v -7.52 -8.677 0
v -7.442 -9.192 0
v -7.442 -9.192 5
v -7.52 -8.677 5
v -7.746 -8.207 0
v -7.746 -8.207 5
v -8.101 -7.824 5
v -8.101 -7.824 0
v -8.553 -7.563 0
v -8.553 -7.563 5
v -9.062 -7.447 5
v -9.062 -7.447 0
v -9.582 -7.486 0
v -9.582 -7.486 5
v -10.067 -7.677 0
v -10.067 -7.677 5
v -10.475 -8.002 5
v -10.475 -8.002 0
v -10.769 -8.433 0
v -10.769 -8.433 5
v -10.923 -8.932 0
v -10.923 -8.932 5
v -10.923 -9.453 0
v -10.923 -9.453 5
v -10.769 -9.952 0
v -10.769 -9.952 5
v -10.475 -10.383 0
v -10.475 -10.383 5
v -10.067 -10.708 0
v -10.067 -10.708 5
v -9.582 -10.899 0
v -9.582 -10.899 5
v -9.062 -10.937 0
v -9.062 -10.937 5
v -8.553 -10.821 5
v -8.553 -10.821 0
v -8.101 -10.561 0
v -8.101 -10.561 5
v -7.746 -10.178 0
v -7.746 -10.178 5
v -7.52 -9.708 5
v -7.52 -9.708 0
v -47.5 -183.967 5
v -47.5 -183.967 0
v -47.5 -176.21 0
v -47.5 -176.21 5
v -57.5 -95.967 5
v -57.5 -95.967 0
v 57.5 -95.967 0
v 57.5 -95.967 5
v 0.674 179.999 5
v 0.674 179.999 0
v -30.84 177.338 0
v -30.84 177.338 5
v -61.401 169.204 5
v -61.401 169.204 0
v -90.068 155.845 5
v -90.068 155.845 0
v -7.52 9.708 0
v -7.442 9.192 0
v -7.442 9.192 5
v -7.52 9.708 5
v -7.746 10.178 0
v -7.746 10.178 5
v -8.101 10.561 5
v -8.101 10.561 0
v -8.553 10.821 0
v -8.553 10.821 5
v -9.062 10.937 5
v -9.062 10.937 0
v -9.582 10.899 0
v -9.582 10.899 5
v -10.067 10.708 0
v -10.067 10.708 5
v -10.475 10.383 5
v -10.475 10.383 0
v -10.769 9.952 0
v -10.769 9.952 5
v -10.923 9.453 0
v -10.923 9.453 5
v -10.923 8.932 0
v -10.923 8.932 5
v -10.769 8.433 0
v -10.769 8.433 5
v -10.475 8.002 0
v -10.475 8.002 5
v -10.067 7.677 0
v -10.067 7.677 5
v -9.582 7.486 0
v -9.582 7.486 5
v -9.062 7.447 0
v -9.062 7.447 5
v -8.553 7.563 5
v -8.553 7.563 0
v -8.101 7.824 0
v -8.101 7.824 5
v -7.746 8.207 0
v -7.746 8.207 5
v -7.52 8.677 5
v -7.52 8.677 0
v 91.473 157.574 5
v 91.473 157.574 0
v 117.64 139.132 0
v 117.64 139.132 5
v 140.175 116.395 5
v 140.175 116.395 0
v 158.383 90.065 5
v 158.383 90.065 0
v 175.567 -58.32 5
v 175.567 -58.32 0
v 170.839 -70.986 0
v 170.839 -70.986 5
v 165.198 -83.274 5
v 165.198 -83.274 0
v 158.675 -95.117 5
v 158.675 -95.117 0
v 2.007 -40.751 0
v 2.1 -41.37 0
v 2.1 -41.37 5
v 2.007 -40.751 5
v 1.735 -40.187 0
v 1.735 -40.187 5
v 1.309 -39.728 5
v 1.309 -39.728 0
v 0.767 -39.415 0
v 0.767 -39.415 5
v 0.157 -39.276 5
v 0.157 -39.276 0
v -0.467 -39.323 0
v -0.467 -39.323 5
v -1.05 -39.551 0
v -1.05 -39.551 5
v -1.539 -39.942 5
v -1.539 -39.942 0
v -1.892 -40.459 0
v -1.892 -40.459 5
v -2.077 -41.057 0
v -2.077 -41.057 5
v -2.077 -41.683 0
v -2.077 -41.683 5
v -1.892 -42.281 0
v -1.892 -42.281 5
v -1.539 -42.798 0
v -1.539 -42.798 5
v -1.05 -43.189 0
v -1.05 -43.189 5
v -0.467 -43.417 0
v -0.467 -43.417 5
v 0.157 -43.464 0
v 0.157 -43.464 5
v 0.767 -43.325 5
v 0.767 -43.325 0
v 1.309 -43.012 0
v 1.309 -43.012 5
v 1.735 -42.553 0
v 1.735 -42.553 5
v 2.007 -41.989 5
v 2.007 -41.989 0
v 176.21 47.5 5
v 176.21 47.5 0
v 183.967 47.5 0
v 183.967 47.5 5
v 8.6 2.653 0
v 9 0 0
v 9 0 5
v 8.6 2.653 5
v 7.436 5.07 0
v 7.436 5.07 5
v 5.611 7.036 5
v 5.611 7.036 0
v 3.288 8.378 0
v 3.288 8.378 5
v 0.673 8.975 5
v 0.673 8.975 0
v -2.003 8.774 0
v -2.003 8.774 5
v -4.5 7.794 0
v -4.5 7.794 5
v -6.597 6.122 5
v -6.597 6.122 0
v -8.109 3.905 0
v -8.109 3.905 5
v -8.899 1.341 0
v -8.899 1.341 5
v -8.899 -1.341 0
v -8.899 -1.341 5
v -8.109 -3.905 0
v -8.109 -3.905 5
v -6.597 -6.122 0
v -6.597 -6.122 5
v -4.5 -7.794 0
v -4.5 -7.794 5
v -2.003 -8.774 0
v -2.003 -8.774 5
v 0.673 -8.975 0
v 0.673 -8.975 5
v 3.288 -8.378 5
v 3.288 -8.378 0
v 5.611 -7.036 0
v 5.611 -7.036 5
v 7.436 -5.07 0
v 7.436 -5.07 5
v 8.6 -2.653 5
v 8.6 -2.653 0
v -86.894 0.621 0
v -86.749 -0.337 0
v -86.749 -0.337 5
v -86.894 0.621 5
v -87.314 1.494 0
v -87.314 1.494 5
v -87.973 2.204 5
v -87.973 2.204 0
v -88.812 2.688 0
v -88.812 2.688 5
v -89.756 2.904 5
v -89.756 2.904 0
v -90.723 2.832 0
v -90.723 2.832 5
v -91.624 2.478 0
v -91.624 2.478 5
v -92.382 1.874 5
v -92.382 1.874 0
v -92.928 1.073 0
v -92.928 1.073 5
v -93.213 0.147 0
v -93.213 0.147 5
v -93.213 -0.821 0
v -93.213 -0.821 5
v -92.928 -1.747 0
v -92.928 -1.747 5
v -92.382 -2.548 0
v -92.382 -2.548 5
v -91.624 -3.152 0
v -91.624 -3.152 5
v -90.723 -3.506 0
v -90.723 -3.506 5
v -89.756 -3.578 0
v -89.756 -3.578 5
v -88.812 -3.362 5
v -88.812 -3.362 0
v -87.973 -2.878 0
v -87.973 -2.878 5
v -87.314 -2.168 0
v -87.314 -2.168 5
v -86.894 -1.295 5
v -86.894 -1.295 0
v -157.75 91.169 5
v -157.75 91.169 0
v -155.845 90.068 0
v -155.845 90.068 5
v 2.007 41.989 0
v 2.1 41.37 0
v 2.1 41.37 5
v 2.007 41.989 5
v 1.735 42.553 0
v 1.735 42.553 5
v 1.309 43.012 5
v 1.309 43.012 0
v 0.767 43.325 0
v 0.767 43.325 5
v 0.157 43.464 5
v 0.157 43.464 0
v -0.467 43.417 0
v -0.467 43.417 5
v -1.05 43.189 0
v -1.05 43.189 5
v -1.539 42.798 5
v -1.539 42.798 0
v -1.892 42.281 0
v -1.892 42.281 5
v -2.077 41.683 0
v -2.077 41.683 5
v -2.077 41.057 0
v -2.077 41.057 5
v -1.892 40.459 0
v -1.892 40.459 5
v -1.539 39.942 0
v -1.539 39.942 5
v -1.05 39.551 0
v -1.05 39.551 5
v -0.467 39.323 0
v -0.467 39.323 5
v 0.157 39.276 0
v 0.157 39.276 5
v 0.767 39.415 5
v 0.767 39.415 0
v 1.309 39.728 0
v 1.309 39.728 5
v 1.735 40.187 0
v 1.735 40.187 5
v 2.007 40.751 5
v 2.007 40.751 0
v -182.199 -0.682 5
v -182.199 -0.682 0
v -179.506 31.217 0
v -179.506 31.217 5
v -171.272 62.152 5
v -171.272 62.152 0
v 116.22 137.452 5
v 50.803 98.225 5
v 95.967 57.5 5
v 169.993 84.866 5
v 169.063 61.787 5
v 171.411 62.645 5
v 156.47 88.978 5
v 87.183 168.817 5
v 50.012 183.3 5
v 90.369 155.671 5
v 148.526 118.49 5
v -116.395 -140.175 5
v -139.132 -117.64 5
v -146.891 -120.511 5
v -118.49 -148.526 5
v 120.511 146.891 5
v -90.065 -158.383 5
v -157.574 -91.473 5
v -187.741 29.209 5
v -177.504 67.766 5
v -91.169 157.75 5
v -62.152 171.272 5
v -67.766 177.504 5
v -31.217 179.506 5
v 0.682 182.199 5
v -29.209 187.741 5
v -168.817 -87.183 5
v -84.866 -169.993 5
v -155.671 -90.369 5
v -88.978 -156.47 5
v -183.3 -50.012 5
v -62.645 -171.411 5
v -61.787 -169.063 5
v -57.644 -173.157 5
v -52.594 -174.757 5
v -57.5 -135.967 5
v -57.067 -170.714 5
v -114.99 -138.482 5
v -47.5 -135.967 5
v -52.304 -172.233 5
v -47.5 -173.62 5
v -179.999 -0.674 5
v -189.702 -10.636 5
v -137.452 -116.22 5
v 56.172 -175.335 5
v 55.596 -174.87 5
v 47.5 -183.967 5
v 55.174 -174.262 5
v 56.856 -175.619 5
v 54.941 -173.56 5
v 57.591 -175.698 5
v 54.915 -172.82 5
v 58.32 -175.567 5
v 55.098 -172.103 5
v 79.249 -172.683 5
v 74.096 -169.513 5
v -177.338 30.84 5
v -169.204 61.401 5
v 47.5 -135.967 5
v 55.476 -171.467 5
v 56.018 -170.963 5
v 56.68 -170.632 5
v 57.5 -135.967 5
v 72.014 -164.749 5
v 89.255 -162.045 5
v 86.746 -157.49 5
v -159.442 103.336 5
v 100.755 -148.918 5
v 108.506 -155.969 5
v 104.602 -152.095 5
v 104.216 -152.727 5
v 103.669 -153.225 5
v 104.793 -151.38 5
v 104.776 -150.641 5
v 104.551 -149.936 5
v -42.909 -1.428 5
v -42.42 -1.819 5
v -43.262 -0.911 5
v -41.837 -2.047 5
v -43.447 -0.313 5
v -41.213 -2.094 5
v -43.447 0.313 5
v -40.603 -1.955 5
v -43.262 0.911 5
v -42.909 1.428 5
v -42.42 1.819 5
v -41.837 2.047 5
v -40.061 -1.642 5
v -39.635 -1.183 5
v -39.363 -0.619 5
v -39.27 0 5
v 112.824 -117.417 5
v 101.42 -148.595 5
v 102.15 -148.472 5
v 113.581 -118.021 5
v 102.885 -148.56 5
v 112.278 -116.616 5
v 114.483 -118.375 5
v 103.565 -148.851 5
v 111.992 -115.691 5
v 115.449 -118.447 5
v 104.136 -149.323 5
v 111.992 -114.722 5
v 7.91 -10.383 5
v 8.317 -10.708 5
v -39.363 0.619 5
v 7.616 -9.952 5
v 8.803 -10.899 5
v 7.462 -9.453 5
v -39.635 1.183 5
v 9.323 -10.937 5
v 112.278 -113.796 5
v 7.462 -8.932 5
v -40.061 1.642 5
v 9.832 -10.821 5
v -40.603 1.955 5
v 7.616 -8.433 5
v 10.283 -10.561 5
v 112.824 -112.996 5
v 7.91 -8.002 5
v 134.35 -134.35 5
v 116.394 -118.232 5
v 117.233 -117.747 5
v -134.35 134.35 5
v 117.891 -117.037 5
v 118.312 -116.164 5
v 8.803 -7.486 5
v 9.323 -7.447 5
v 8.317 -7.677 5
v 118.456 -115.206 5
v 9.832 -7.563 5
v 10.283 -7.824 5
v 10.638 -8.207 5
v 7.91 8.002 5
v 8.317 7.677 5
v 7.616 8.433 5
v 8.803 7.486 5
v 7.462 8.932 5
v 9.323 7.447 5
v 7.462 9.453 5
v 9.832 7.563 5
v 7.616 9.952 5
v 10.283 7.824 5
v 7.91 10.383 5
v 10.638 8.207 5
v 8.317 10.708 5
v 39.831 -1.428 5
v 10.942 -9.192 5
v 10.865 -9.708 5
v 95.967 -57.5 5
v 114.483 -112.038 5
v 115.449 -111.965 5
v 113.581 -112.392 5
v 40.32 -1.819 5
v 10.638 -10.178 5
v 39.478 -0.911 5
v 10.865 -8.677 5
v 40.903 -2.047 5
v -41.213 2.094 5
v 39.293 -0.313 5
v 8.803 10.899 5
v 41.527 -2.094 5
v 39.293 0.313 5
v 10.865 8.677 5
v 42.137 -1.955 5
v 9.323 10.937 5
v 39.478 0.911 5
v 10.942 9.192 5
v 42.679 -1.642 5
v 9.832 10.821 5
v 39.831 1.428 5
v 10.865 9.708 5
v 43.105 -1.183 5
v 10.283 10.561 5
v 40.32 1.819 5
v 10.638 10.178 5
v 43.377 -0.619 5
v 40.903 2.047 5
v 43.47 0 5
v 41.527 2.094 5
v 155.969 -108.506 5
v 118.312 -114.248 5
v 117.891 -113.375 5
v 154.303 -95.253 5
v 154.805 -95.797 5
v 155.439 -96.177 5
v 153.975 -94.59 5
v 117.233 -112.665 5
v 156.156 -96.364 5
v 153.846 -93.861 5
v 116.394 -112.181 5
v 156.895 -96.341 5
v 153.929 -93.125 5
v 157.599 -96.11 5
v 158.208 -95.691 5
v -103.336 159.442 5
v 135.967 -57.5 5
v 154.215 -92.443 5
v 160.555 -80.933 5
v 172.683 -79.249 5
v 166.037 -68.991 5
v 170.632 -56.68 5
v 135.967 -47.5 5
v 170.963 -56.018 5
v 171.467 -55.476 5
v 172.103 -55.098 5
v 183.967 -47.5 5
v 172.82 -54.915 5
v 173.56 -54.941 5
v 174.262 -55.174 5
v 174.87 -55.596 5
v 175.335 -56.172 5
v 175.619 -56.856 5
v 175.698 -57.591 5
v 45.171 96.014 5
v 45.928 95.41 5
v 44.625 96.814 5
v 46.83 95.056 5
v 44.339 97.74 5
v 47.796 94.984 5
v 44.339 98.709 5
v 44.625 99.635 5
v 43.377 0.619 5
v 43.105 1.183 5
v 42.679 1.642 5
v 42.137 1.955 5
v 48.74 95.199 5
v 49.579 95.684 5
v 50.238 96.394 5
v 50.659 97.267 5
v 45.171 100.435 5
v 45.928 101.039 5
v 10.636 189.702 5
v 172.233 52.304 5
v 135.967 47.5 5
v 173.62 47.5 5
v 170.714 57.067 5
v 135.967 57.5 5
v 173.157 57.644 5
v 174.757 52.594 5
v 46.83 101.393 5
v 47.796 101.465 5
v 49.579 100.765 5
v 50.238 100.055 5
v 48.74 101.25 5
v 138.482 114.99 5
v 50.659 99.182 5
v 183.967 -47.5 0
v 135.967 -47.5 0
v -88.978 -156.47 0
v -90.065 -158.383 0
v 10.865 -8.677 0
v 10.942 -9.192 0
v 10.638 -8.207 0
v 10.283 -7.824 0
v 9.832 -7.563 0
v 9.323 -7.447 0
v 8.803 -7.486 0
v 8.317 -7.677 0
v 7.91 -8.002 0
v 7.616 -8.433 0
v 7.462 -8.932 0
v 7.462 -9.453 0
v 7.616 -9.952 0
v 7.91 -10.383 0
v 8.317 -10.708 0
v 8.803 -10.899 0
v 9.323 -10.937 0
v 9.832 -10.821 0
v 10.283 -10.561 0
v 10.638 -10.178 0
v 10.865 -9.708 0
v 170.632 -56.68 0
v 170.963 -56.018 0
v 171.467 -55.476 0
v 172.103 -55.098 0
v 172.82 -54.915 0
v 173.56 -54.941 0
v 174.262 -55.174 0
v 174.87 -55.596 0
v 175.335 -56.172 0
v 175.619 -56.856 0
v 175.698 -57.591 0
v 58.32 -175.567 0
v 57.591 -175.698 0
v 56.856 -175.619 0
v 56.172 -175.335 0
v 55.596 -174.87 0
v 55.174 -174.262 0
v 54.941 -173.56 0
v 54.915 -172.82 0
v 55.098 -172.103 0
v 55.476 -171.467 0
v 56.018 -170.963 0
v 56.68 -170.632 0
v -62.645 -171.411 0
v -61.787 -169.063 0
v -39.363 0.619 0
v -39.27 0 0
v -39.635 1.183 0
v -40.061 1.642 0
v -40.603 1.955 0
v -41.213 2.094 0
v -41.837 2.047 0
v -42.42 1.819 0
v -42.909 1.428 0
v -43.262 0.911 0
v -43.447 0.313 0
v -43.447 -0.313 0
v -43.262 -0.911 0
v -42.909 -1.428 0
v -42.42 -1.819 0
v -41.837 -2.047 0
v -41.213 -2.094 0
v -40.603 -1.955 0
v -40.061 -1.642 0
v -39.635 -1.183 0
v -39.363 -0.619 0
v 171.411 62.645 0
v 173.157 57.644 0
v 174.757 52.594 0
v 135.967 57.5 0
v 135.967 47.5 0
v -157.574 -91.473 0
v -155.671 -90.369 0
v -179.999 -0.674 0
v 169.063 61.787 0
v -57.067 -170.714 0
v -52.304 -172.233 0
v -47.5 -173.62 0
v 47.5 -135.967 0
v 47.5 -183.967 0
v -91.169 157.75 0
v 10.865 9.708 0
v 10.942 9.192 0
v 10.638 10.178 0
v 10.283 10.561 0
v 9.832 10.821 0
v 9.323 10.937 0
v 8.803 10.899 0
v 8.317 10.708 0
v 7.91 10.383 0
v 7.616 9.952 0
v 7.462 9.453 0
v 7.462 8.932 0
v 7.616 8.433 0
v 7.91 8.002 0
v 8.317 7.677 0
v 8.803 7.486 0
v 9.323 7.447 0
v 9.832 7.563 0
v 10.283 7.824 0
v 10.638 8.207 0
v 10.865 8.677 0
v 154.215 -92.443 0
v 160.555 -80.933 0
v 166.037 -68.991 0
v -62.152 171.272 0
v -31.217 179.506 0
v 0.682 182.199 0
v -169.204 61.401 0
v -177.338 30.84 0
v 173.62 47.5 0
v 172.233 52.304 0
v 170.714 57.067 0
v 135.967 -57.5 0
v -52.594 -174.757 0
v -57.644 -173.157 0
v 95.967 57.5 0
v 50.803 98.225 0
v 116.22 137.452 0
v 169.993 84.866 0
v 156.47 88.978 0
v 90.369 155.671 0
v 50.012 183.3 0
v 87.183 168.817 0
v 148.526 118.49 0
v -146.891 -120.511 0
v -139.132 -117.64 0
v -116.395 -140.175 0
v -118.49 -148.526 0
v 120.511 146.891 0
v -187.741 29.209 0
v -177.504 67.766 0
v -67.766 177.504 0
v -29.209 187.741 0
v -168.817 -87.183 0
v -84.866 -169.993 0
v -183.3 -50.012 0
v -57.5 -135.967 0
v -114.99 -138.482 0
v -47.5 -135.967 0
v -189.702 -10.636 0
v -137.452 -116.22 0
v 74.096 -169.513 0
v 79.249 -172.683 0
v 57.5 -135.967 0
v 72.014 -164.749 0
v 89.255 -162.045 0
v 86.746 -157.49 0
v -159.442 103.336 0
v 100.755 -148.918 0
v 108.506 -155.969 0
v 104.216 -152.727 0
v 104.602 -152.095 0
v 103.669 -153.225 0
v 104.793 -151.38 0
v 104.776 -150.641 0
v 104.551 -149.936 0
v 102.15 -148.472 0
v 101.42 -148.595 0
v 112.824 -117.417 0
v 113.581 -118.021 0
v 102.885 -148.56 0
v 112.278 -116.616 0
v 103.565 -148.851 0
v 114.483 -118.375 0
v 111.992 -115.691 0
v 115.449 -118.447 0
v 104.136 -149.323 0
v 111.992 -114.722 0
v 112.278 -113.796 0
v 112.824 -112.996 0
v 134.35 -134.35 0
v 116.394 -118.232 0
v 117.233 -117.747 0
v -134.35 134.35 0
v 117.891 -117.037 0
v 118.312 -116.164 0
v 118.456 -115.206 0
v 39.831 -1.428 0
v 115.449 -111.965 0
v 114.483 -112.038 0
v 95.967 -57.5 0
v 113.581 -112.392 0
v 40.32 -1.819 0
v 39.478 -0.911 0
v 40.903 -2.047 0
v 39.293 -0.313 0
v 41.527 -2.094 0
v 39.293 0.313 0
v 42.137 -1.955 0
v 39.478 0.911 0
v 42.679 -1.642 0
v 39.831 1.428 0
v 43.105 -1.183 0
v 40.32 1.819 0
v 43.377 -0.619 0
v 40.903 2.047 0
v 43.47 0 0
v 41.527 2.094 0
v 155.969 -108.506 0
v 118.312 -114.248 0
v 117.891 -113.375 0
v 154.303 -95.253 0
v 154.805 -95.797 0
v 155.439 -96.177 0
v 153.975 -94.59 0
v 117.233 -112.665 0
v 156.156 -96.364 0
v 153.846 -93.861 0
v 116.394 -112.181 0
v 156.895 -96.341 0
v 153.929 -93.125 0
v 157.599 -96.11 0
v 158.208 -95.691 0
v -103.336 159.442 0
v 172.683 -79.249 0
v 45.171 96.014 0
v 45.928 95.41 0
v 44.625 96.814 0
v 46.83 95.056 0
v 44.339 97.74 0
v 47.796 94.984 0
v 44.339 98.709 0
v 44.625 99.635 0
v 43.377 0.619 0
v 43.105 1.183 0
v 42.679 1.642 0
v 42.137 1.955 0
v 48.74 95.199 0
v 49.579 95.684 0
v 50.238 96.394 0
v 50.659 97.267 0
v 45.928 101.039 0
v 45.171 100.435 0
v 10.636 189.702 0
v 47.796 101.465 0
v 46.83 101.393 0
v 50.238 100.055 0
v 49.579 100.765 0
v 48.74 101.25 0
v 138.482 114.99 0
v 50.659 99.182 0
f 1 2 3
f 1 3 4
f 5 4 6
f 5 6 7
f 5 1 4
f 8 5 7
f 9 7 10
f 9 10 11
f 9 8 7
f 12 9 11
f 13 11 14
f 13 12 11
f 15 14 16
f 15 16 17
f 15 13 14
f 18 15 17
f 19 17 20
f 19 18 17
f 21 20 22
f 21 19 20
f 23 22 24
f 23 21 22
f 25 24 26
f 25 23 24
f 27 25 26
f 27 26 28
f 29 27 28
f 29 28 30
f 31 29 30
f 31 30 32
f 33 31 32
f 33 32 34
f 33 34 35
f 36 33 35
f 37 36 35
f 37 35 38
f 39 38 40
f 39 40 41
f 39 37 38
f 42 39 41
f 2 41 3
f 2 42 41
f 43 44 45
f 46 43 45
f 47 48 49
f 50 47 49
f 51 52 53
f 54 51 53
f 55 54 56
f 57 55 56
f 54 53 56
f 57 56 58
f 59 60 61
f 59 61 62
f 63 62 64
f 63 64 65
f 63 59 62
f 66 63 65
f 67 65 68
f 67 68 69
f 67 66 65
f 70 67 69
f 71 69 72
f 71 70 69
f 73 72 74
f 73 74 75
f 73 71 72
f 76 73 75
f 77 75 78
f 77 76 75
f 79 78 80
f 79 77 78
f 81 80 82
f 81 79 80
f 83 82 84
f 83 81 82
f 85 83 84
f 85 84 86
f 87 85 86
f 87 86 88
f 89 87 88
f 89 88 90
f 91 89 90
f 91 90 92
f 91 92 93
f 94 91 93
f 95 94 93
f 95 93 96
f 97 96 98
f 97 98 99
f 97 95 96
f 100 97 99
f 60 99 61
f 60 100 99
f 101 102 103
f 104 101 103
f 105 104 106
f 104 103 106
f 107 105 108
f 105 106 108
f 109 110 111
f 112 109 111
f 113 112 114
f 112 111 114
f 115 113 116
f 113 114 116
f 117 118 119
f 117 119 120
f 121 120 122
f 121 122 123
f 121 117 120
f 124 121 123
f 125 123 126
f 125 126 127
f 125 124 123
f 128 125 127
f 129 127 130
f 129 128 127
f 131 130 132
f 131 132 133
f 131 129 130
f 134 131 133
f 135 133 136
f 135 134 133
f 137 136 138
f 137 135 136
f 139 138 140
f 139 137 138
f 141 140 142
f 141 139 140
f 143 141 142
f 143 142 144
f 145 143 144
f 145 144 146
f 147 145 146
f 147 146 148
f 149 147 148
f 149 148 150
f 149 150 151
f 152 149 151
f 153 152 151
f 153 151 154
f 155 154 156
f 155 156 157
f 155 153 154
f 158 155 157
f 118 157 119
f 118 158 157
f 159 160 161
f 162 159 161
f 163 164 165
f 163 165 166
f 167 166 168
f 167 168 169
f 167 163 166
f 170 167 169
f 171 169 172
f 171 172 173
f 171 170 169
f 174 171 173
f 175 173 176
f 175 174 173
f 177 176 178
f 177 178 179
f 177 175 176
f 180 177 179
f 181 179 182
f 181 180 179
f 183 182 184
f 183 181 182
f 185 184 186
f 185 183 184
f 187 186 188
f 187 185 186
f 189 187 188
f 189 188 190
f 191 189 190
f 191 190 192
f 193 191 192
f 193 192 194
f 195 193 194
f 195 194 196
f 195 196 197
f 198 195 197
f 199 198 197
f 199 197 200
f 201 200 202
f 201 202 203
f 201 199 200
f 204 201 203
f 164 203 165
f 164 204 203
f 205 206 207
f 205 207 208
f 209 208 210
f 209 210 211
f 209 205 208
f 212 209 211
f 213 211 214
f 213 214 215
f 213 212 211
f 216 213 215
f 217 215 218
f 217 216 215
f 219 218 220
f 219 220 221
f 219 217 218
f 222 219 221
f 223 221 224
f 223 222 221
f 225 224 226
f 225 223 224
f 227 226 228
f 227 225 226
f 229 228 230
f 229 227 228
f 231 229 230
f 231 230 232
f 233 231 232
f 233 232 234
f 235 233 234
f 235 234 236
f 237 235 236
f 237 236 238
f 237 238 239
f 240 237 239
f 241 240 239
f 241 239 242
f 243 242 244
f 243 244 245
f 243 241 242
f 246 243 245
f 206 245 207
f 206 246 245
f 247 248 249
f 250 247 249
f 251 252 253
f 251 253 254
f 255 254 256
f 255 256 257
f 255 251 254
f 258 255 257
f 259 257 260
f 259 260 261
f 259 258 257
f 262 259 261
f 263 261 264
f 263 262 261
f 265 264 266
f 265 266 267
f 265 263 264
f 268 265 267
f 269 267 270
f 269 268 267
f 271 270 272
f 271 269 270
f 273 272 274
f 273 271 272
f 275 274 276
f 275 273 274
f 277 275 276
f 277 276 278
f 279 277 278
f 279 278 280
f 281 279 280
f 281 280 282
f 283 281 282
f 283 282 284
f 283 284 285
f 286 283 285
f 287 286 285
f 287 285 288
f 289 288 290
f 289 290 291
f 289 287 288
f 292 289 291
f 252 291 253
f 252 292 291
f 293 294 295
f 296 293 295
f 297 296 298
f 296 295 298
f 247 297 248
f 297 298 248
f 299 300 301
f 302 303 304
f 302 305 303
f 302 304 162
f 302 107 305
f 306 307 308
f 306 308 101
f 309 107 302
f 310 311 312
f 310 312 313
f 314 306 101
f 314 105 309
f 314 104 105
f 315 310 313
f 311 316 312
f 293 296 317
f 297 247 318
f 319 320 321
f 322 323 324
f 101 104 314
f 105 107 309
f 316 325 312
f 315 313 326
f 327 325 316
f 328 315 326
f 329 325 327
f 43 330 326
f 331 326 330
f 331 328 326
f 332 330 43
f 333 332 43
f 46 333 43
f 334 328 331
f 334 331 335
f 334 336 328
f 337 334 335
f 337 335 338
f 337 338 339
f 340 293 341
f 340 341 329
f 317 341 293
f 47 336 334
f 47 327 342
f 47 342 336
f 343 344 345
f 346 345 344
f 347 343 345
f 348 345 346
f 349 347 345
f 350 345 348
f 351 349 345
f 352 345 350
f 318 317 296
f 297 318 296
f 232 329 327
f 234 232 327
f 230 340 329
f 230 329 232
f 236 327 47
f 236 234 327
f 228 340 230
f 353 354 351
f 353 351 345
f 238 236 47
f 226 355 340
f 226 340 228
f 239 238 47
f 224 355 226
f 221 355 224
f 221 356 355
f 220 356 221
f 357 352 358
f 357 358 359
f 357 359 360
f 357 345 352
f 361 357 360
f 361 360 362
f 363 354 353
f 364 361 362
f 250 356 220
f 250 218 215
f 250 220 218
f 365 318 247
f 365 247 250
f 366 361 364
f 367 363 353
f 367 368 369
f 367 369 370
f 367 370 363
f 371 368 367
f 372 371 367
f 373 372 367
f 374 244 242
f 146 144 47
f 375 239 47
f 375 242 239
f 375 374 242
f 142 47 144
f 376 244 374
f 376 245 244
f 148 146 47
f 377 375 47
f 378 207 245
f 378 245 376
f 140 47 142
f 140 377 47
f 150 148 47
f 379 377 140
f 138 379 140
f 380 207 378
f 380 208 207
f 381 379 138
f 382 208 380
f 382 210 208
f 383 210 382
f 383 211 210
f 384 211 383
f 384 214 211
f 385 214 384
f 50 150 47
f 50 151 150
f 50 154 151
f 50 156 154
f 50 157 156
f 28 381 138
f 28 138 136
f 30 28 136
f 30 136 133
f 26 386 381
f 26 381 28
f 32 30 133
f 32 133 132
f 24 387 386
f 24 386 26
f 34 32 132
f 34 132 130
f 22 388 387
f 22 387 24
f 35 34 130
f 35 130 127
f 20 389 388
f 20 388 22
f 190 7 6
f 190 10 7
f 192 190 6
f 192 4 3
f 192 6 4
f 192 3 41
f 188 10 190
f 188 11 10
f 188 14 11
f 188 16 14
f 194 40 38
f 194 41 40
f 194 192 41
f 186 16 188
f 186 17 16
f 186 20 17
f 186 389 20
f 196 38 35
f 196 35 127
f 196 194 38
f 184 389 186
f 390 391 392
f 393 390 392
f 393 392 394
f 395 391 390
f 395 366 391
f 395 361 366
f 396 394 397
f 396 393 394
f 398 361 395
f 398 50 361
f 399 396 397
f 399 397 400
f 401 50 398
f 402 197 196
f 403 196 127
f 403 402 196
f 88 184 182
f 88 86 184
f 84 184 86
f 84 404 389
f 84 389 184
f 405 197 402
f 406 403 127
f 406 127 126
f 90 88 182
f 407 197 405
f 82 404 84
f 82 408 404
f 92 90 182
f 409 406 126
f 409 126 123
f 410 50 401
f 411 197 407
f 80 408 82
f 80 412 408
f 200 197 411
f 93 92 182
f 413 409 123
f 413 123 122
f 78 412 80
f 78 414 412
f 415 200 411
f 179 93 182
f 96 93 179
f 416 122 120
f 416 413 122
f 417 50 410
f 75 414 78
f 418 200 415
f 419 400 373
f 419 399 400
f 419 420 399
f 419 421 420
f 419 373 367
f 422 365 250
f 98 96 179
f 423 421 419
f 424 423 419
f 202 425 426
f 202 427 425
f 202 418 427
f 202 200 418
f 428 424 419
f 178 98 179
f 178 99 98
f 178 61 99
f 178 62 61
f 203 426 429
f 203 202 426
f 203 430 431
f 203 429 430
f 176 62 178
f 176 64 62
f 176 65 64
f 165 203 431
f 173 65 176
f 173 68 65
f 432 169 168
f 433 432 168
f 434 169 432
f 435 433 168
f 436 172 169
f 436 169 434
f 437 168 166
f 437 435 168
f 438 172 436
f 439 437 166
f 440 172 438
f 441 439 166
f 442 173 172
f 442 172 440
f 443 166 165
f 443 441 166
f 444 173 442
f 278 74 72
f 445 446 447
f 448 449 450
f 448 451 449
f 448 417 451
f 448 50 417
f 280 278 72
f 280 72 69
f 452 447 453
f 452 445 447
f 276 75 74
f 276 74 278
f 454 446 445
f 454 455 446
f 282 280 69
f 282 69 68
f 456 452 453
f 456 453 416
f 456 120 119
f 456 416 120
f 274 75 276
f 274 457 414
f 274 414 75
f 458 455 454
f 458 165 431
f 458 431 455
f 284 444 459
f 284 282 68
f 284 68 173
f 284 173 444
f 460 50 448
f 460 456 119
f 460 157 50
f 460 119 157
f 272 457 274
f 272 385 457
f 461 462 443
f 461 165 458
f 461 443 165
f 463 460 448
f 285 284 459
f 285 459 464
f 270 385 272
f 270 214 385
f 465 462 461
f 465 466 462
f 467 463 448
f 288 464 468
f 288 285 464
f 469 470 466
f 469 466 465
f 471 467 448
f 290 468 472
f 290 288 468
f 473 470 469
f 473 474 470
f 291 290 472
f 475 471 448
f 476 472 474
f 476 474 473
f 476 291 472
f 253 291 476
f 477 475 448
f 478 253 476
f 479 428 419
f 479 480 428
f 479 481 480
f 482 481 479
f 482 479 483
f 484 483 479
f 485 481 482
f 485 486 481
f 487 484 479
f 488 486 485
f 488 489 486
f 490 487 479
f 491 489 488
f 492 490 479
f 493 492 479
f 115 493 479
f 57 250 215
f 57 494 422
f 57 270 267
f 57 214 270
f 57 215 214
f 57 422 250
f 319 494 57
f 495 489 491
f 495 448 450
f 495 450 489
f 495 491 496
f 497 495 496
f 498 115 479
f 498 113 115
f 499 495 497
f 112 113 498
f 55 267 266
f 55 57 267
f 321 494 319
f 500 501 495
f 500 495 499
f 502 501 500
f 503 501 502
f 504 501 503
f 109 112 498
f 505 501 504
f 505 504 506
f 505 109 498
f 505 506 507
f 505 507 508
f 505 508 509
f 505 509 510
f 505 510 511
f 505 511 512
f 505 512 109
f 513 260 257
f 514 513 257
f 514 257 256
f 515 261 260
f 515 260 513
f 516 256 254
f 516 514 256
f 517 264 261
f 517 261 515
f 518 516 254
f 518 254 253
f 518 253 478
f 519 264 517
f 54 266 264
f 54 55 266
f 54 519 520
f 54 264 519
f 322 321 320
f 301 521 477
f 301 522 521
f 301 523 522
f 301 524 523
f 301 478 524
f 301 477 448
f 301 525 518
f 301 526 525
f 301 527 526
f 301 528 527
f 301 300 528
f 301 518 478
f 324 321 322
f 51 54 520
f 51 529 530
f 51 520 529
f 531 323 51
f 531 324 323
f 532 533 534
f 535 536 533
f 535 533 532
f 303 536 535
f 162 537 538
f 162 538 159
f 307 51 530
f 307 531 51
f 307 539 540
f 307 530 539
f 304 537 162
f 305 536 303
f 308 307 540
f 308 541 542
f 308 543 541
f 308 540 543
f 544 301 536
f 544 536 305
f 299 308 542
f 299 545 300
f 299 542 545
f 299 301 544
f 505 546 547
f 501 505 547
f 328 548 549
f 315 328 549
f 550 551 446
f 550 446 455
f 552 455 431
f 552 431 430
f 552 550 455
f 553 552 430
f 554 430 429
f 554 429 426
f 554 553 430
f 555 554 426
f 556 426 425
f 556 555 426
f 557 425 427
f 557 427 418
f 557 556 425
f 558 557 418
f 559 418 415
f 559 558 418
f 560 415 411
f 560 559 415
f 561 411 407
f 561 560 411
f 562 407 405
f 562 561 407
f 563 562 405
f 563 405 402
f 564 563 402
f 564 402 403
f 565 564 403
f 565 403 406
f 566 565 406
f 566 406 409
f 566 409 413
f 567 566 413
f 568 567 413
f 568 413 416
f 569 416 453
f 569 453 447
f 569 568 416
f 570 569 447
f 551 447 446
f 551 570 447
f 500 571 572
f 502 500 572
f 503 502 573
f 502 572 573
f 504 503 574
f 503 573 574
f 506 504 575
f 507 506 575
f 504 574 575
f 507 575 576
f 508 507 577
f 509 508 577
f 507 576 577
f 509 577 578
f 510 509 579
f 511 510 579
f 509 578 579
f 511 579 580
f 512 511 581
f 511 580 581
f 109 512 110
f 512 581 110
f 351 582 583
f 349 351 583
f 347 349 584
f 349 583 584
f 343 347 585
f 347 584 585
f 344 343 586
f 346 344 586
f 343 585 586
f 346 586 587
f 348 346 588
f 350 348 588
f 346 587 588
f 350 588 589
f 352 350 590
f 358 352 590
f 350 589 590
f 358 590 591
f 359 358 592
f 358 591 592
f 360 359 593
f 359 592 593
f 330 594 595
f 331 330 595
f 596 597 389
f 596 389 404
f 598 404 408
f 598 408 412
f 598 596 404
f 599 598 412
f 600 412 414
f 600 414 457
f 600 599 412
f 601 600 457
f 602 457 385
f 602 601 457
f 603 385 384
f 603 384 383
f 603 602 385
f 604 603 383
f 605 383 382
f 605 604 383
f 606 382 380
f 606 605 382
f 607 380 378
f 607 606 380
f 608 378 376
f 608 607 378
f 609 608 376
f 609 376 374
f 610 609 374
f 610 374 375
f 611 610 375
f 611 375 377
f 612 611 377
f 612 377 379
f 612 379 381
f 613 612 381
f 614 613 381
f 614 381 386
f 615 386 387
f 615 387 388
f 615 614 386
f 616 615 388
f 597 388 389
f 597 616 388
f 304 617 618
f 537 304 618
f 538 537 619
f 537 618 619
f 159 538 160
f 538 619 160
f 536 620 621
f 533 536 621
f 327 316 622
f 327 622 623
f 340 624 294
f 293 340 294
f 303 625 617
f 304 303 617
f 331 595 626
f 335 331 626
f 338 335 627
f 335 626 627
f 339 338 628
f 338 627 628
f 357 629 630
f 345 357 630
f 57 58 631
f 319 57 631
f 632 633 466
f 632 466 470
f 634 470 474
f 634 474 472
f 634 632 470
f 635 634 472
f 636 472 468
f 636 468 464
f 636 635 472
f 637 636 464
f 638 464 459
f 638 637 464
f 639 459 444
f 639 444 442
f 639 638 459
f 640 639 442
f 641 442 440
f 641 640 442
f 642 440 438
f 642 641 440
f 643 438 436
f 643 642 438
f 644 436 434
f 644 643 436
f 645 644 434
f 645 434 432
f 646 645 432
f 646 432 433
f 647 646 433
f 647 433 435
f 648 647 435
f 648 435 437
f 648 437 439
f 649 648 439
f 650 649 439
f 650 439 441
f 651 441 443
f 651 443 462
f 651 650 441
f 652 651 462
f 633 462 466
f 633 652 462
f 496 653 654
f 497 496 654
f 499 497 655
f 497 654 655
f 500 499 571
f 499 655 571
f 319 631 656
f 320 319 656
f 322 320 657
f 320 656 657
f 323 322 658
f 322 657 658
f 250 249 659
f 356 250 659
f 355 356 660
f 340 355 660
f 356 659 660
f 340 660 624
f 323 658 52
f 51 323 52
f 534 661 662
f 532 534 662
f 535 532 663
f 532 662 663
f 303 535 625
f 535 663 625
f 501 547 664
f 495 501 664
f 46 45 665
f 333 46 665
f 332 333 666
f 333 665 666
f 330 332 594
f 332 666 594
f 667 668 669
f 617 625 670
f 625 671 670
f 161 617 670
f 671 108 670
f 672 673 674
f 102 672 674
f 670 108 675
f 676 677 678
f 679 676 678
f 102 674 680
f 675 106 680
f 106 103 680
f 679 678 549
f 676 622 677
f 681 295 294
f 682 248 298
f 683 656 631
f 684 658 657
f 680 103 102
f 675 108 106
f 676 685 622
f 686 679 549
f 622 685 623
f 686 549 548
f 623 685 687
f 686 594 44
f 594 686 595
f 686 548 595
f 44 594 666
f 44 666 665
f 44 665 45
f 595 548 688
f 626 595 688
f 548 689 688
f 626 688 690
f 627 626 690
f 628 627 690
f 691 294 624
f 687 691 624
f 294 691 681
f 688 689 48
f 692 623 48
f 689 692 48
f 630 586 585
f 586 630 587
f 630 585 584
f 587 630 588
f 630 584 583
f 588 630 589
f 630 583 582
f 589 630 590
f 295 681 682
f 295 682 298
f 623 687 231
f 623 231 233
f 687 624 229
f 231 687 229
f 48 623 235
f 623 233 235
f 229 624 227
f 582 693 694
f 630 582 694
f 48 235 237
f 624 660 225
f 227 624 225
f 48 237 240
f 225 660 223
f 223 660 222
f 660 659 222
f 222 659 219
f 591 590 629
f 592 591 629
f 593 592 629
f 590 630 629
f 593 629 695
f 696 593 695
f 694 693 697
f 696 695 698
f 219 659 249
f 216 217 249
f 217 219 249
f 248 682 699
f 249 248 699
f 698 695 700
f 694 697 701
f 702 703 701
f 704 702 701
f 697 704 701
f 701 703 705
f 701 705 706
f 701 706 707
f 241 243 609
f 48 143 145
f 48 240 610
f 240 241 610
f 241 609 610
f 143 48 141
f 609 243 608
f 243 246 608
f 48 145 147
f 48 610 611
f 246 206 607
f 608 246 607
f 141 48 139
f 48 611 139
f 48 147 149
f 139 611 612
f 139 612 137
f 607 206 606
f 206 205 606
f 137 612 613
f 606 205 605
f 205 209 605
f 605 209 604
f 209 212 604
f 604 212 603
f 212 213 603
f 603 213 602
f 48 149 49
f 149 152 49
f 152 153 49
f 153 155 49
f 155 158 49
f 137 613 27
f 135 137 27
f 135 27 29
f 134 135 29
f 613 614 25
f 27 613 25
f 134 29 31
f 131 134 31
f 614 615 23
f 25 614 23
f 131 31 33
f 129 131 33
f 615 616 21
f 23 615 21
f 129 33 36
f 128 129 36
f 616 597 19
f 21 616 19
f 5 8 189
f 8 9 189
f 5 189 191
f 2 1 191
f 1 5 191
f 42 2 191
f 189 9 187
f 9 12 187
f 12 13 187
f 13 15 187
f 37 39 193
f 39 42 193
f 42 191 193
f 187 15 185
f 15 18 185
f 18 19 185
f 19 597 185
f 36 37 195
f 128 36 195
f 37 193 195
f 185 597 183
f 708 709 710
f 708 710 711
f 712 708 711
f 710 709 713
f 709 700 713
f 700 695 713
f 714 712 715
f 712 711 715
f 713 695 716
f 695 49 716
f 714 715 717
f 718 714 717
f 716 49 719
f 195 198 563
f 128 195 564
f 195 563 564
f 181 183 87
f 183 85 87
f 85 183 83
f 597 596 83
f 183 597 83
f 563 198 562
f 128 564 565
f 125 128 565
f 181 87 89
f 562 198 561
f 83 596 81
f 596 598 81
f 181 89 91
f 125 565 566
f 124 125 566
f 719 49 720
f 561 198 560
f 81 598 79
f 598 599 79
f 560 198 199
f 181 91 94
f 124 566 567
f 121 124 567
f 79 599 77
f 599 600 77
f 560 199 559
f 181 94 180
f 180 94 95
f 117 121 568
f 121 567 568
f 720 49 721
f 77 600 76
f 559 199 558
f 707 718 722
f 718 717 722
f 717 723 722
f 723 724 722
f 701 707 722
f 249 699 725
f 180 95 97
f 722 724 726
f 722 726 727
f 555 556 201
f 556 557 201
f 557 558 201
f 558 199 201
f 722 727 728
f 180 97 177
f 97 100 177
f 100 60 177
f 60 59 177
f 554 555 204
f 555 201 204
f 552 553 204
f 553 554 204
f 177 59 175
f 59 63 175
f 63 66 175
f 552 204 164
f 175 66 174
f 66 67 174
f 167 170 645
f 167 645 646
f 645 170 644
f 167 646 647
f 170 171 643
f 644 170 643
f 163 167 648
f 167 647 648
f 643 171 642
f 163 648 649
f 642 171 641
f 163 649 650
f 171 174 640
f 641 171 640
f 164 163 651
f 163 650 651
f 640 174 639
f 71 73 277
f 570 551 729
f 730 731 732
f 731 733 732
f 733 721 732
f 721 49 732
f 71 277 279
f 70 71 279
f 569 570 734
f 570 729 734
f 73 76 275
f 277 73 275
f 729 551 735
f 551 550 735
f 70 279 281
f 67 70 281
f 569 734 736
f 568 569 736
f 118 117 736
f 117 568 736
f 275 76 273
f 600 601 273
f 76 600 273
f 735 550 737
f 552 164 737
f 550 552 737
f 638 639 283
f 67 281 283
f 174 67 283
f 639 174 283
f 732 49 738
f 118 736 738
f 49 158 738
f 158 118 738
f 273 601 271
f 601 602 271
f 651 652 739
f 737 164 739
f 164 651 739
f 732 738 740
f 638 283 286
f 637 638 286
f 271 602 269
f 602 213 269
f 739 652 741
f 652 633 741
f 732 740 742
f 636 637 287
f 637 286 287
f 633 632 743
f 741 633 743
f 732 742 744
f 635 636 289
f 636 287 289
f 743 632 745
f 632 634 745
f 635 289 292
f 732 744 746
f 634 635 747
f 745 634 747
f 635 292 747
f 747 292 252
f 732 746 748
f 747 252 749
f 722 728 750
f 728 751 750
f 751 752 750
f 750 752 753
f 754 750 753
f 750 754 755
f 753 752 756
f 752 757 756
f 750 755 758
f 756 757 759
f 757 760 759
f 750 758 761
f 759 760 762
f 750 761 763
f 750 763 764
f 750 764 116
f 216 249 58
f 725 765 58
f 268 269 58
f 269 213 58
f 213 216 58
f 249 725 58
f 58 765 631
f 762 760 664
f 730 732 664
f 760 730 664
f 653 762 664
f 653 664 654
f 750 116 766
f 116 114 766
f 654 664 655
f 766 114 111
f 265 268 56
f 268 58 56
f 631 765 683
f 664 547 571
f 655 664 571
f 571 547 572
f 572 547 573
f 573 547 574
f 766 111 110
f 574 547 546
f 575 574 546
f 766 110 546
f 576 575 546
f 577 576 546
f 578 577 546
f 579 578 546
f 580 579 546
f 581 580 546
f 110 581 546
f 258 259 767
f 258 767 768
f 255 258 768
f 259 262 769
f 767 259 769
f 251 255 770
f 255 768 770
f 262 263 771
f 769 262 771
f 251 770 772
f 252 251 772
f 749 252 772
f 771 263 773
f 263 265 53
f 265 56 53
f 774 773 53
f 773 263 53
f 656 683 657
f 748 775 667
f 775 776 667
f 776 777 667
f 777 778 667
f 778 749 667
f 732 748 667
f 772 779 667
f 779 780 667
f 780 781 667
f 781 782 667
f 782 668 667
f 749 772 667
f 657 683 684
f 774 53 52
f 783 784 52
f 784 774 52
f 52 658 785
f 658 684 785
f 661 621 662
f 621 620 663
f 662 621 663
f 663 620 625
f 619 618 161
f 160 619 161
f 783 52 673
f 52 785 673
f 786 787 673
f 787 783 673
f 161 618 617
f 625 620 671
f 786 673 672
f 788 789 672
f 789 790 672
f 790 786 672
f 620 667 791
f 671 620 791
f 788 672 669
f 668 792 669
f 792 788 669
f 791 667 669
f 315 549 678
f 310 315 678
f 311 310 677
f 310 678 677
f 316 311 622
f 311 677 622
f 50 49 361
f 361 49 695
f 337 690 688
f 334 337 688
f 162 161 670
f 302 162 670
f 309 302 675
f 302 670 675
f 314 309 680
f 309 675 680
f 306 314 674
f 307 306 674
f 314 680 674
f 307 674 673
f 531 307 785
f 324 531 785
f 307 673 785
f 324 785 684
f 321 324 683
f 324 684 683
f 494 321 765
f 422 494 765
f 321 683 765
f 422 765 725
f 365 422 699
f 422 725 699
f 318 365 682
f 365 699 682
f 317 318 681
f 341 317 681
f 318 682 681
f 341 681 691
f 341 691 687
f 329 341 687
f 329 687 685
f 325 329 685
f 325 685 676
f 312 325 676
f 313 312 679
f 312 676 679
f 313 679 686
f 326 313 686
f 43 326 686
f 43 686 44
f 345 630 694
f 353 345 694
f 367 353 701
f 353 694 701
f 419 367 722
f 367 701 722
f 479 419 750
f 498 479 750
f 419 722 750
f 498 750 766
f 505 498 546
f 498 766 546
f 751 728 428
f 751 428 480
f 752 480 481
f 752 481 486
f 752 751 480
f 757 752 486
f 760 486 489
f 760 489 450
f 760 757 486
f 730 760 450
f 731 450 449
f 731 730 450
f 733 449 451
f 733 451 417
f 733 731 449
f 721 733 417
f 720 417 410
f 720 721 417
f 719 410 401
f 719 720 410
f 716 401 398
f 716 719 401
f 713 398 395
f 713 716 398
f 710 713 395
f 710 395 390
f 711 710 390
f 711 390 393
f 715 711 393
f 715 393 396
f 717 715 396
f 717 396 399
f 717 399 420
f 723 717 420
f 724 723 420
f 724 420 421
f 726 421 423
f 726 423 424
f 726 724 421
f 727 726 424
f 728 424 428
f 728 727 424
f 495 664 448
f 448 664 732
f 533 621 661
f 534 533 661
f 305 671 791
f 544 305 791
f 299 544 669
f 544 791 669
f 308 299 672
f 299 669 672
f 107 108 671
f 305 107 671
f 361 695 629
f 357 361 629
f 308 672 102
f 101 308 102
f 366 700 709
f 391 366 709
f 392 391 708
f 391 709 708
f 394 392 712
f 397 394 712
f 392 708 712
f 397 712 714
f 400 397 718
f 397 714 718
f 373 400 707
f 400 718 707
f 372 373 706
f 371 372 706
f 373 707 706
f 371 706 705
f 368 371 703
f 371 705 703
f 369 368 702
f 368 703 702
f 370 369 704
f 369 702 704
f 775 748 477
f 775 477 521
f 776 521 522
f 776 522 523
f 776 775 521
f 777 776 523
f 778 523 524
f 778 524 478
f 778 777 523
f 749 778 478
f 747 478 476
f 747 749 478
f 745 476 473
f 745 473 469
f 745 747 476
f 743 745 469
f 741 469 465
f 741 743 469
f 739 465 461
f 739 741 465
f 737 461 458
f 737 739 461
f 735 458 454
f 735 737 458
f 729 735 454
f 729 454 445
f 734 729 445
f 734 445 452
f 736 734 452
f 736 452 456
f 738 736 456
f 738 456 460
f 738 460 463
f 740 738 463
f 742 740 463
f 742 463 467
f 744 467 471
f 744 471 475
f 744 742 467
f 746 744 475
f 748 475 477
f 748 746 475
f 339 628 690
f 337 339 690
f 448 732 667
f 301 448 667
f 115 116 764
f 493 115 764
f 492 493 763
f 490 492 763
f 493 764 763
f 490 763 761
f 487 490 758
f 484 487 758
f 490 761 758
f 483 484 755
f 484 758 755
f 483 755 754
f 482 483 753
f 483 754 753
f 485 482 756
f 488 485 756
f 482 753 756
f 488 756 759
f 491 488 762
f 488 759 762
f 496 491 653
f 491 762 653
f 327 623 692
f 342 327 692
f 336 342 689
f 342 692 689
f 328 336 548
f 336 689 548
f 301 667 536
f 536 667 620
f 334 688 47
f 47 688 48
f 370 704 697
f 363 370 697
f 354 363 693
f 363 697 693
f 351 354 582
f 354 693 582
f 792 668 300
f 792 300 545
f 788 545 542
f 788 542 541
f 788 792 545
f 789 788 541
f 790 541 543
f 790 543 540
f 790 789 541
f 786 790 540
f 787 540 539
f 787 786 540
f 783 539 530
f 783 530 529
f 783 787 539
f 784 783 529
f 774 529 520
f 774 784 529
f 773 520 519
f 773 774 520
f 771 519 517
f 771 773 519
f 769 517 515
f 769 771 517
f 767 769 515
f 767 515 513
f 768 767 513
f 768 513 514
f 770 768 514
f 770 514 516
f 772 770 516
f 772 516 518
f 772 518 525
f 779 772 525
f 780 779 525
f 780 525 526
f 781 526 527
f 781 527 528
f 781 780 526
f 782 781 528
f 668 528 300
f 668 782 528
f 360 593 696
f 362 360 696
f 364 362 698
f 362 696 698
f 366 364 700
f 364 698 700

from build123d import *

# Parameters (mm, degrees)
SKETCH1_R           = 3.25
SKETCH1_R_2         = 2.1
SKETCH1_R_3         = 1.75
SKETCH1_R_4         = 9
BOSS_EXTRUDE1_DEPTH = 5


with BuildPart() as part:
    # Sketch1 → Boss-Extrude1 (new body)
    with BuildSketch(Plane.XY):
        with BuildLine():
            Line((47.5, -135.966708945), (47.5, -183.966708945))
            ThreePointArc((47.5, -183.966708945), (134.350288425, -134.350288425), (183.966708945, -47.5))
            Line((183.966708945, -47.5), (135.966708945, -47.5))
            Line((135.966708945, -47.5), (135.966708945, -57.5))
            Line((135.966708945, -57.5), (95.966708945, -57.5))
            Line((95.966708945, -57.5), (95.966708945, 57.5))
            Line((95.966708945, 57.5), (135.966708945, 57.5))
            Line((135.966708945, 57.5), (135.966708945, 47.5))
            Line((135.966708945, 47.5), (173.61955535, 47.5))
            ThreePointArc((173.61955535, 47.5), (171.490271693, 54.690828433), (169.063304941, 61.786721248))
            Line((169.063304941, 61.786721248), (171.411406398, 62.644870154))
            ThreePointArc((171.411406398, 62.644870154), (173.97563055, 55.124676642), (176.210101867, 47.5))
            Line((176.210101867, 47.5), (183.966708945, 47.5))
            ThreePointArc((183.966708945, 47.5), (-134.350288425, 134.350288425), (-47.5, -183.966708945))
            Line((-47.5, -183.966708945), (-47.5, -176.210101867))
            ThreePointArc((-47.5, -176.210101867), (-55.124676642, -173.97563055), (-62.644870154, -171.411406398))
            Line((-62.644870154, -171.411406398), (-61.786721248, -169.063304941))
            ThreePointArc((-61.786721248, -169.063304941), (-54.690828433, -171.490271693), (-47.5, -173.61955535))
            Line((-47.5, -173.61955535), (-47.5, -135.966708945))
            Line((-47.5, -135.966708945), (-57.5, -135.966708945))
            Line((-57.5, -135.966708945), (-57.5, -95.966708945))
            Line((-57.5, -95.966708945), (57.5, -95.966708945))
            Line((57.5, -95.966708945), (57.5, -135.966708945))
            Line((57.5, -135.966708945), (47.5, -135.966708945))
        make_face()
        with Locations((47.553086042, 98.224543307)):
            Circle(SKETCH1_R, mode=Mode.SUBTRACT)
        with BuildLine():
            Line((-90.06771897, 155.845455499), (-91.168546646, 157.750233288))
            ThreePointArc((-91.168546646, 157.750233288), (-46.86549419, 176.069490413), (0.682251823, 182.198722642))
            Line((0.682251823, 182.198722642), (0.674013875, 179.998738066))
            ThreePointArc((0.674013875, 179.998738066), (-46.299610067, 173.943514129), (-90.06771897, 155.845455499))
        make_face(mode=Mode.SUBTRACT)
        with BuildLine():
            ThreePointArc((-155.845455499, 90.06771897), (-173.943514129, 46.299610067), (-179.998738066, -0.674013875))
            Line((-179.998738066, -0.674013875), (-182.198722642, -0.682251823))
            ThreePointArc((-182.198722642, -0.682251823), (-176.069490413, 46.86549419), (-157.750233288, 91.168546646))
            Line((-157.750233288, 91.168546646), (-155.845455499, 90.06771897))
        make_face(mode=Mode.SUBTRACT)
        with BuildLine():
            Line((-88.977505429, -156.470455766), (-90.065008273, -158.382872448))
            ThreePointArc((-90.065008273, -158.382872448), (-128.259298986, -129.407852249), (-157.573663687, -91.473386907))
            Line((-157.573663687, -91.473386907), (-155.671017912, -90.368878394))
            ThreePointArc((-155.671017912, -90.368878394), (-126.710613707, -127.845298599), (-88.977505429, -156.470455766))
        make_face(mode=Mode.SUBTRACT)
        with Locations((-89.999369033, -0.337006938)):
            Circle(SKETCH1_R, mode=Mode.SUBTRACT)
        with Locations((-41.37, 0)):
            Circle(SKETCH1_R_2, mode=Mode.SUBTRACT)
        with Locations((-9.192388155, -9.192388155)):
            Circle(SKETCH1_R_3, mode=Mode.SUBTRACT)
        with BuildLine():
            ThreePointArc((103.668630414, -153.224720813), (81.760900425, -165.952267721), (58.319627193, -175.567141243))
            ThreePointArc((58.319627193, -175.567141243), (55.032569907, -173.919338342), (56.680372807, -170.632281056))
            ThreePointArc((56.680372807, -170.632281056), (79.462756197, -161.287663439), (100.754701342, -148.917863795))
            ThreePointArc((100.754701342, -148.917863795), (104.365094387, -149.614327769), (103.668630414, -153.224720813))
        make_face(mode=Mode.SUBTRACT)
        with Locations((115.206196365, -115.206196365)):
            Circle(SKETCH1_R, mode=Mode.SUBTRACT)
        with Locations((0, -41.37)):
            Circle(SKETCH1_R_2, mode=Mode.SUBTRACT)
        with Locations((9.192388155, -9.192388155)):
            Circle(SKETCH1_R_3, mode=Mode.SUBTRACT)
        Circle(SKETCH1_R_4, mode=Mode.SUBTRACT)
        with Locations((41.37, 0)):
            Circle(SKETCH1_R_2, mode=Mode.SUBTRACT)
        with BuildLine():
            ThreePointArc((175.567141243, -58.319627193), (168.13089268, -77.181622984), (158.67524262, -95.116598864))
            ThreePointArc((158.67524262, -95.116598864), (155.108438361, -96.009855479), (154.215181746, -92.443051221))
            ThreePointArc((154.215181746, -92.443051221), (163.405051373, -75.012193581), (170.632281056, -56.680372807))
            ThreePointArc((170.632281056, -56.680372807), (173.919338342, -55.032569907), (175.567141243, -58.319627193))
        make_face(mode=Mode.SUBTRACT)
        with Locations((-9.192388155, 9.192388155)):
            Circle(SKETCH1_R_3, mode=Mode.SUBTRACT)
        with Locations((9.192388155, 9.192388155)):
            Circle(SKETCH1_R_3, mode=Mode.SUBTRACT)
        with Locations((0, 41.37)):
            Circle(SKETCH1_R_2, mode=Mode.SUBTRACT)
        with BuildLine():
            ThreePointArc((91.473386907, 157.573663687), (129.407852249, 128.259298986), (158.382872448, 90.065008273))
            Line((158.382872448, 90.065008273), (156.470455766, 88.977505429))
            ThreePointArc((156.470455766, 88.977505429), (127.845298599, 126.710613707), (90.368878394, 155.671017912))
            Line((90.368878394, 155.671017912), (91.473386907, 157.573663687))
        make_face(mode=Mode.SUBTRACT)
    extrude(amount=BOSS_EXTRUDE1_DEPTH)


solid = part.part
